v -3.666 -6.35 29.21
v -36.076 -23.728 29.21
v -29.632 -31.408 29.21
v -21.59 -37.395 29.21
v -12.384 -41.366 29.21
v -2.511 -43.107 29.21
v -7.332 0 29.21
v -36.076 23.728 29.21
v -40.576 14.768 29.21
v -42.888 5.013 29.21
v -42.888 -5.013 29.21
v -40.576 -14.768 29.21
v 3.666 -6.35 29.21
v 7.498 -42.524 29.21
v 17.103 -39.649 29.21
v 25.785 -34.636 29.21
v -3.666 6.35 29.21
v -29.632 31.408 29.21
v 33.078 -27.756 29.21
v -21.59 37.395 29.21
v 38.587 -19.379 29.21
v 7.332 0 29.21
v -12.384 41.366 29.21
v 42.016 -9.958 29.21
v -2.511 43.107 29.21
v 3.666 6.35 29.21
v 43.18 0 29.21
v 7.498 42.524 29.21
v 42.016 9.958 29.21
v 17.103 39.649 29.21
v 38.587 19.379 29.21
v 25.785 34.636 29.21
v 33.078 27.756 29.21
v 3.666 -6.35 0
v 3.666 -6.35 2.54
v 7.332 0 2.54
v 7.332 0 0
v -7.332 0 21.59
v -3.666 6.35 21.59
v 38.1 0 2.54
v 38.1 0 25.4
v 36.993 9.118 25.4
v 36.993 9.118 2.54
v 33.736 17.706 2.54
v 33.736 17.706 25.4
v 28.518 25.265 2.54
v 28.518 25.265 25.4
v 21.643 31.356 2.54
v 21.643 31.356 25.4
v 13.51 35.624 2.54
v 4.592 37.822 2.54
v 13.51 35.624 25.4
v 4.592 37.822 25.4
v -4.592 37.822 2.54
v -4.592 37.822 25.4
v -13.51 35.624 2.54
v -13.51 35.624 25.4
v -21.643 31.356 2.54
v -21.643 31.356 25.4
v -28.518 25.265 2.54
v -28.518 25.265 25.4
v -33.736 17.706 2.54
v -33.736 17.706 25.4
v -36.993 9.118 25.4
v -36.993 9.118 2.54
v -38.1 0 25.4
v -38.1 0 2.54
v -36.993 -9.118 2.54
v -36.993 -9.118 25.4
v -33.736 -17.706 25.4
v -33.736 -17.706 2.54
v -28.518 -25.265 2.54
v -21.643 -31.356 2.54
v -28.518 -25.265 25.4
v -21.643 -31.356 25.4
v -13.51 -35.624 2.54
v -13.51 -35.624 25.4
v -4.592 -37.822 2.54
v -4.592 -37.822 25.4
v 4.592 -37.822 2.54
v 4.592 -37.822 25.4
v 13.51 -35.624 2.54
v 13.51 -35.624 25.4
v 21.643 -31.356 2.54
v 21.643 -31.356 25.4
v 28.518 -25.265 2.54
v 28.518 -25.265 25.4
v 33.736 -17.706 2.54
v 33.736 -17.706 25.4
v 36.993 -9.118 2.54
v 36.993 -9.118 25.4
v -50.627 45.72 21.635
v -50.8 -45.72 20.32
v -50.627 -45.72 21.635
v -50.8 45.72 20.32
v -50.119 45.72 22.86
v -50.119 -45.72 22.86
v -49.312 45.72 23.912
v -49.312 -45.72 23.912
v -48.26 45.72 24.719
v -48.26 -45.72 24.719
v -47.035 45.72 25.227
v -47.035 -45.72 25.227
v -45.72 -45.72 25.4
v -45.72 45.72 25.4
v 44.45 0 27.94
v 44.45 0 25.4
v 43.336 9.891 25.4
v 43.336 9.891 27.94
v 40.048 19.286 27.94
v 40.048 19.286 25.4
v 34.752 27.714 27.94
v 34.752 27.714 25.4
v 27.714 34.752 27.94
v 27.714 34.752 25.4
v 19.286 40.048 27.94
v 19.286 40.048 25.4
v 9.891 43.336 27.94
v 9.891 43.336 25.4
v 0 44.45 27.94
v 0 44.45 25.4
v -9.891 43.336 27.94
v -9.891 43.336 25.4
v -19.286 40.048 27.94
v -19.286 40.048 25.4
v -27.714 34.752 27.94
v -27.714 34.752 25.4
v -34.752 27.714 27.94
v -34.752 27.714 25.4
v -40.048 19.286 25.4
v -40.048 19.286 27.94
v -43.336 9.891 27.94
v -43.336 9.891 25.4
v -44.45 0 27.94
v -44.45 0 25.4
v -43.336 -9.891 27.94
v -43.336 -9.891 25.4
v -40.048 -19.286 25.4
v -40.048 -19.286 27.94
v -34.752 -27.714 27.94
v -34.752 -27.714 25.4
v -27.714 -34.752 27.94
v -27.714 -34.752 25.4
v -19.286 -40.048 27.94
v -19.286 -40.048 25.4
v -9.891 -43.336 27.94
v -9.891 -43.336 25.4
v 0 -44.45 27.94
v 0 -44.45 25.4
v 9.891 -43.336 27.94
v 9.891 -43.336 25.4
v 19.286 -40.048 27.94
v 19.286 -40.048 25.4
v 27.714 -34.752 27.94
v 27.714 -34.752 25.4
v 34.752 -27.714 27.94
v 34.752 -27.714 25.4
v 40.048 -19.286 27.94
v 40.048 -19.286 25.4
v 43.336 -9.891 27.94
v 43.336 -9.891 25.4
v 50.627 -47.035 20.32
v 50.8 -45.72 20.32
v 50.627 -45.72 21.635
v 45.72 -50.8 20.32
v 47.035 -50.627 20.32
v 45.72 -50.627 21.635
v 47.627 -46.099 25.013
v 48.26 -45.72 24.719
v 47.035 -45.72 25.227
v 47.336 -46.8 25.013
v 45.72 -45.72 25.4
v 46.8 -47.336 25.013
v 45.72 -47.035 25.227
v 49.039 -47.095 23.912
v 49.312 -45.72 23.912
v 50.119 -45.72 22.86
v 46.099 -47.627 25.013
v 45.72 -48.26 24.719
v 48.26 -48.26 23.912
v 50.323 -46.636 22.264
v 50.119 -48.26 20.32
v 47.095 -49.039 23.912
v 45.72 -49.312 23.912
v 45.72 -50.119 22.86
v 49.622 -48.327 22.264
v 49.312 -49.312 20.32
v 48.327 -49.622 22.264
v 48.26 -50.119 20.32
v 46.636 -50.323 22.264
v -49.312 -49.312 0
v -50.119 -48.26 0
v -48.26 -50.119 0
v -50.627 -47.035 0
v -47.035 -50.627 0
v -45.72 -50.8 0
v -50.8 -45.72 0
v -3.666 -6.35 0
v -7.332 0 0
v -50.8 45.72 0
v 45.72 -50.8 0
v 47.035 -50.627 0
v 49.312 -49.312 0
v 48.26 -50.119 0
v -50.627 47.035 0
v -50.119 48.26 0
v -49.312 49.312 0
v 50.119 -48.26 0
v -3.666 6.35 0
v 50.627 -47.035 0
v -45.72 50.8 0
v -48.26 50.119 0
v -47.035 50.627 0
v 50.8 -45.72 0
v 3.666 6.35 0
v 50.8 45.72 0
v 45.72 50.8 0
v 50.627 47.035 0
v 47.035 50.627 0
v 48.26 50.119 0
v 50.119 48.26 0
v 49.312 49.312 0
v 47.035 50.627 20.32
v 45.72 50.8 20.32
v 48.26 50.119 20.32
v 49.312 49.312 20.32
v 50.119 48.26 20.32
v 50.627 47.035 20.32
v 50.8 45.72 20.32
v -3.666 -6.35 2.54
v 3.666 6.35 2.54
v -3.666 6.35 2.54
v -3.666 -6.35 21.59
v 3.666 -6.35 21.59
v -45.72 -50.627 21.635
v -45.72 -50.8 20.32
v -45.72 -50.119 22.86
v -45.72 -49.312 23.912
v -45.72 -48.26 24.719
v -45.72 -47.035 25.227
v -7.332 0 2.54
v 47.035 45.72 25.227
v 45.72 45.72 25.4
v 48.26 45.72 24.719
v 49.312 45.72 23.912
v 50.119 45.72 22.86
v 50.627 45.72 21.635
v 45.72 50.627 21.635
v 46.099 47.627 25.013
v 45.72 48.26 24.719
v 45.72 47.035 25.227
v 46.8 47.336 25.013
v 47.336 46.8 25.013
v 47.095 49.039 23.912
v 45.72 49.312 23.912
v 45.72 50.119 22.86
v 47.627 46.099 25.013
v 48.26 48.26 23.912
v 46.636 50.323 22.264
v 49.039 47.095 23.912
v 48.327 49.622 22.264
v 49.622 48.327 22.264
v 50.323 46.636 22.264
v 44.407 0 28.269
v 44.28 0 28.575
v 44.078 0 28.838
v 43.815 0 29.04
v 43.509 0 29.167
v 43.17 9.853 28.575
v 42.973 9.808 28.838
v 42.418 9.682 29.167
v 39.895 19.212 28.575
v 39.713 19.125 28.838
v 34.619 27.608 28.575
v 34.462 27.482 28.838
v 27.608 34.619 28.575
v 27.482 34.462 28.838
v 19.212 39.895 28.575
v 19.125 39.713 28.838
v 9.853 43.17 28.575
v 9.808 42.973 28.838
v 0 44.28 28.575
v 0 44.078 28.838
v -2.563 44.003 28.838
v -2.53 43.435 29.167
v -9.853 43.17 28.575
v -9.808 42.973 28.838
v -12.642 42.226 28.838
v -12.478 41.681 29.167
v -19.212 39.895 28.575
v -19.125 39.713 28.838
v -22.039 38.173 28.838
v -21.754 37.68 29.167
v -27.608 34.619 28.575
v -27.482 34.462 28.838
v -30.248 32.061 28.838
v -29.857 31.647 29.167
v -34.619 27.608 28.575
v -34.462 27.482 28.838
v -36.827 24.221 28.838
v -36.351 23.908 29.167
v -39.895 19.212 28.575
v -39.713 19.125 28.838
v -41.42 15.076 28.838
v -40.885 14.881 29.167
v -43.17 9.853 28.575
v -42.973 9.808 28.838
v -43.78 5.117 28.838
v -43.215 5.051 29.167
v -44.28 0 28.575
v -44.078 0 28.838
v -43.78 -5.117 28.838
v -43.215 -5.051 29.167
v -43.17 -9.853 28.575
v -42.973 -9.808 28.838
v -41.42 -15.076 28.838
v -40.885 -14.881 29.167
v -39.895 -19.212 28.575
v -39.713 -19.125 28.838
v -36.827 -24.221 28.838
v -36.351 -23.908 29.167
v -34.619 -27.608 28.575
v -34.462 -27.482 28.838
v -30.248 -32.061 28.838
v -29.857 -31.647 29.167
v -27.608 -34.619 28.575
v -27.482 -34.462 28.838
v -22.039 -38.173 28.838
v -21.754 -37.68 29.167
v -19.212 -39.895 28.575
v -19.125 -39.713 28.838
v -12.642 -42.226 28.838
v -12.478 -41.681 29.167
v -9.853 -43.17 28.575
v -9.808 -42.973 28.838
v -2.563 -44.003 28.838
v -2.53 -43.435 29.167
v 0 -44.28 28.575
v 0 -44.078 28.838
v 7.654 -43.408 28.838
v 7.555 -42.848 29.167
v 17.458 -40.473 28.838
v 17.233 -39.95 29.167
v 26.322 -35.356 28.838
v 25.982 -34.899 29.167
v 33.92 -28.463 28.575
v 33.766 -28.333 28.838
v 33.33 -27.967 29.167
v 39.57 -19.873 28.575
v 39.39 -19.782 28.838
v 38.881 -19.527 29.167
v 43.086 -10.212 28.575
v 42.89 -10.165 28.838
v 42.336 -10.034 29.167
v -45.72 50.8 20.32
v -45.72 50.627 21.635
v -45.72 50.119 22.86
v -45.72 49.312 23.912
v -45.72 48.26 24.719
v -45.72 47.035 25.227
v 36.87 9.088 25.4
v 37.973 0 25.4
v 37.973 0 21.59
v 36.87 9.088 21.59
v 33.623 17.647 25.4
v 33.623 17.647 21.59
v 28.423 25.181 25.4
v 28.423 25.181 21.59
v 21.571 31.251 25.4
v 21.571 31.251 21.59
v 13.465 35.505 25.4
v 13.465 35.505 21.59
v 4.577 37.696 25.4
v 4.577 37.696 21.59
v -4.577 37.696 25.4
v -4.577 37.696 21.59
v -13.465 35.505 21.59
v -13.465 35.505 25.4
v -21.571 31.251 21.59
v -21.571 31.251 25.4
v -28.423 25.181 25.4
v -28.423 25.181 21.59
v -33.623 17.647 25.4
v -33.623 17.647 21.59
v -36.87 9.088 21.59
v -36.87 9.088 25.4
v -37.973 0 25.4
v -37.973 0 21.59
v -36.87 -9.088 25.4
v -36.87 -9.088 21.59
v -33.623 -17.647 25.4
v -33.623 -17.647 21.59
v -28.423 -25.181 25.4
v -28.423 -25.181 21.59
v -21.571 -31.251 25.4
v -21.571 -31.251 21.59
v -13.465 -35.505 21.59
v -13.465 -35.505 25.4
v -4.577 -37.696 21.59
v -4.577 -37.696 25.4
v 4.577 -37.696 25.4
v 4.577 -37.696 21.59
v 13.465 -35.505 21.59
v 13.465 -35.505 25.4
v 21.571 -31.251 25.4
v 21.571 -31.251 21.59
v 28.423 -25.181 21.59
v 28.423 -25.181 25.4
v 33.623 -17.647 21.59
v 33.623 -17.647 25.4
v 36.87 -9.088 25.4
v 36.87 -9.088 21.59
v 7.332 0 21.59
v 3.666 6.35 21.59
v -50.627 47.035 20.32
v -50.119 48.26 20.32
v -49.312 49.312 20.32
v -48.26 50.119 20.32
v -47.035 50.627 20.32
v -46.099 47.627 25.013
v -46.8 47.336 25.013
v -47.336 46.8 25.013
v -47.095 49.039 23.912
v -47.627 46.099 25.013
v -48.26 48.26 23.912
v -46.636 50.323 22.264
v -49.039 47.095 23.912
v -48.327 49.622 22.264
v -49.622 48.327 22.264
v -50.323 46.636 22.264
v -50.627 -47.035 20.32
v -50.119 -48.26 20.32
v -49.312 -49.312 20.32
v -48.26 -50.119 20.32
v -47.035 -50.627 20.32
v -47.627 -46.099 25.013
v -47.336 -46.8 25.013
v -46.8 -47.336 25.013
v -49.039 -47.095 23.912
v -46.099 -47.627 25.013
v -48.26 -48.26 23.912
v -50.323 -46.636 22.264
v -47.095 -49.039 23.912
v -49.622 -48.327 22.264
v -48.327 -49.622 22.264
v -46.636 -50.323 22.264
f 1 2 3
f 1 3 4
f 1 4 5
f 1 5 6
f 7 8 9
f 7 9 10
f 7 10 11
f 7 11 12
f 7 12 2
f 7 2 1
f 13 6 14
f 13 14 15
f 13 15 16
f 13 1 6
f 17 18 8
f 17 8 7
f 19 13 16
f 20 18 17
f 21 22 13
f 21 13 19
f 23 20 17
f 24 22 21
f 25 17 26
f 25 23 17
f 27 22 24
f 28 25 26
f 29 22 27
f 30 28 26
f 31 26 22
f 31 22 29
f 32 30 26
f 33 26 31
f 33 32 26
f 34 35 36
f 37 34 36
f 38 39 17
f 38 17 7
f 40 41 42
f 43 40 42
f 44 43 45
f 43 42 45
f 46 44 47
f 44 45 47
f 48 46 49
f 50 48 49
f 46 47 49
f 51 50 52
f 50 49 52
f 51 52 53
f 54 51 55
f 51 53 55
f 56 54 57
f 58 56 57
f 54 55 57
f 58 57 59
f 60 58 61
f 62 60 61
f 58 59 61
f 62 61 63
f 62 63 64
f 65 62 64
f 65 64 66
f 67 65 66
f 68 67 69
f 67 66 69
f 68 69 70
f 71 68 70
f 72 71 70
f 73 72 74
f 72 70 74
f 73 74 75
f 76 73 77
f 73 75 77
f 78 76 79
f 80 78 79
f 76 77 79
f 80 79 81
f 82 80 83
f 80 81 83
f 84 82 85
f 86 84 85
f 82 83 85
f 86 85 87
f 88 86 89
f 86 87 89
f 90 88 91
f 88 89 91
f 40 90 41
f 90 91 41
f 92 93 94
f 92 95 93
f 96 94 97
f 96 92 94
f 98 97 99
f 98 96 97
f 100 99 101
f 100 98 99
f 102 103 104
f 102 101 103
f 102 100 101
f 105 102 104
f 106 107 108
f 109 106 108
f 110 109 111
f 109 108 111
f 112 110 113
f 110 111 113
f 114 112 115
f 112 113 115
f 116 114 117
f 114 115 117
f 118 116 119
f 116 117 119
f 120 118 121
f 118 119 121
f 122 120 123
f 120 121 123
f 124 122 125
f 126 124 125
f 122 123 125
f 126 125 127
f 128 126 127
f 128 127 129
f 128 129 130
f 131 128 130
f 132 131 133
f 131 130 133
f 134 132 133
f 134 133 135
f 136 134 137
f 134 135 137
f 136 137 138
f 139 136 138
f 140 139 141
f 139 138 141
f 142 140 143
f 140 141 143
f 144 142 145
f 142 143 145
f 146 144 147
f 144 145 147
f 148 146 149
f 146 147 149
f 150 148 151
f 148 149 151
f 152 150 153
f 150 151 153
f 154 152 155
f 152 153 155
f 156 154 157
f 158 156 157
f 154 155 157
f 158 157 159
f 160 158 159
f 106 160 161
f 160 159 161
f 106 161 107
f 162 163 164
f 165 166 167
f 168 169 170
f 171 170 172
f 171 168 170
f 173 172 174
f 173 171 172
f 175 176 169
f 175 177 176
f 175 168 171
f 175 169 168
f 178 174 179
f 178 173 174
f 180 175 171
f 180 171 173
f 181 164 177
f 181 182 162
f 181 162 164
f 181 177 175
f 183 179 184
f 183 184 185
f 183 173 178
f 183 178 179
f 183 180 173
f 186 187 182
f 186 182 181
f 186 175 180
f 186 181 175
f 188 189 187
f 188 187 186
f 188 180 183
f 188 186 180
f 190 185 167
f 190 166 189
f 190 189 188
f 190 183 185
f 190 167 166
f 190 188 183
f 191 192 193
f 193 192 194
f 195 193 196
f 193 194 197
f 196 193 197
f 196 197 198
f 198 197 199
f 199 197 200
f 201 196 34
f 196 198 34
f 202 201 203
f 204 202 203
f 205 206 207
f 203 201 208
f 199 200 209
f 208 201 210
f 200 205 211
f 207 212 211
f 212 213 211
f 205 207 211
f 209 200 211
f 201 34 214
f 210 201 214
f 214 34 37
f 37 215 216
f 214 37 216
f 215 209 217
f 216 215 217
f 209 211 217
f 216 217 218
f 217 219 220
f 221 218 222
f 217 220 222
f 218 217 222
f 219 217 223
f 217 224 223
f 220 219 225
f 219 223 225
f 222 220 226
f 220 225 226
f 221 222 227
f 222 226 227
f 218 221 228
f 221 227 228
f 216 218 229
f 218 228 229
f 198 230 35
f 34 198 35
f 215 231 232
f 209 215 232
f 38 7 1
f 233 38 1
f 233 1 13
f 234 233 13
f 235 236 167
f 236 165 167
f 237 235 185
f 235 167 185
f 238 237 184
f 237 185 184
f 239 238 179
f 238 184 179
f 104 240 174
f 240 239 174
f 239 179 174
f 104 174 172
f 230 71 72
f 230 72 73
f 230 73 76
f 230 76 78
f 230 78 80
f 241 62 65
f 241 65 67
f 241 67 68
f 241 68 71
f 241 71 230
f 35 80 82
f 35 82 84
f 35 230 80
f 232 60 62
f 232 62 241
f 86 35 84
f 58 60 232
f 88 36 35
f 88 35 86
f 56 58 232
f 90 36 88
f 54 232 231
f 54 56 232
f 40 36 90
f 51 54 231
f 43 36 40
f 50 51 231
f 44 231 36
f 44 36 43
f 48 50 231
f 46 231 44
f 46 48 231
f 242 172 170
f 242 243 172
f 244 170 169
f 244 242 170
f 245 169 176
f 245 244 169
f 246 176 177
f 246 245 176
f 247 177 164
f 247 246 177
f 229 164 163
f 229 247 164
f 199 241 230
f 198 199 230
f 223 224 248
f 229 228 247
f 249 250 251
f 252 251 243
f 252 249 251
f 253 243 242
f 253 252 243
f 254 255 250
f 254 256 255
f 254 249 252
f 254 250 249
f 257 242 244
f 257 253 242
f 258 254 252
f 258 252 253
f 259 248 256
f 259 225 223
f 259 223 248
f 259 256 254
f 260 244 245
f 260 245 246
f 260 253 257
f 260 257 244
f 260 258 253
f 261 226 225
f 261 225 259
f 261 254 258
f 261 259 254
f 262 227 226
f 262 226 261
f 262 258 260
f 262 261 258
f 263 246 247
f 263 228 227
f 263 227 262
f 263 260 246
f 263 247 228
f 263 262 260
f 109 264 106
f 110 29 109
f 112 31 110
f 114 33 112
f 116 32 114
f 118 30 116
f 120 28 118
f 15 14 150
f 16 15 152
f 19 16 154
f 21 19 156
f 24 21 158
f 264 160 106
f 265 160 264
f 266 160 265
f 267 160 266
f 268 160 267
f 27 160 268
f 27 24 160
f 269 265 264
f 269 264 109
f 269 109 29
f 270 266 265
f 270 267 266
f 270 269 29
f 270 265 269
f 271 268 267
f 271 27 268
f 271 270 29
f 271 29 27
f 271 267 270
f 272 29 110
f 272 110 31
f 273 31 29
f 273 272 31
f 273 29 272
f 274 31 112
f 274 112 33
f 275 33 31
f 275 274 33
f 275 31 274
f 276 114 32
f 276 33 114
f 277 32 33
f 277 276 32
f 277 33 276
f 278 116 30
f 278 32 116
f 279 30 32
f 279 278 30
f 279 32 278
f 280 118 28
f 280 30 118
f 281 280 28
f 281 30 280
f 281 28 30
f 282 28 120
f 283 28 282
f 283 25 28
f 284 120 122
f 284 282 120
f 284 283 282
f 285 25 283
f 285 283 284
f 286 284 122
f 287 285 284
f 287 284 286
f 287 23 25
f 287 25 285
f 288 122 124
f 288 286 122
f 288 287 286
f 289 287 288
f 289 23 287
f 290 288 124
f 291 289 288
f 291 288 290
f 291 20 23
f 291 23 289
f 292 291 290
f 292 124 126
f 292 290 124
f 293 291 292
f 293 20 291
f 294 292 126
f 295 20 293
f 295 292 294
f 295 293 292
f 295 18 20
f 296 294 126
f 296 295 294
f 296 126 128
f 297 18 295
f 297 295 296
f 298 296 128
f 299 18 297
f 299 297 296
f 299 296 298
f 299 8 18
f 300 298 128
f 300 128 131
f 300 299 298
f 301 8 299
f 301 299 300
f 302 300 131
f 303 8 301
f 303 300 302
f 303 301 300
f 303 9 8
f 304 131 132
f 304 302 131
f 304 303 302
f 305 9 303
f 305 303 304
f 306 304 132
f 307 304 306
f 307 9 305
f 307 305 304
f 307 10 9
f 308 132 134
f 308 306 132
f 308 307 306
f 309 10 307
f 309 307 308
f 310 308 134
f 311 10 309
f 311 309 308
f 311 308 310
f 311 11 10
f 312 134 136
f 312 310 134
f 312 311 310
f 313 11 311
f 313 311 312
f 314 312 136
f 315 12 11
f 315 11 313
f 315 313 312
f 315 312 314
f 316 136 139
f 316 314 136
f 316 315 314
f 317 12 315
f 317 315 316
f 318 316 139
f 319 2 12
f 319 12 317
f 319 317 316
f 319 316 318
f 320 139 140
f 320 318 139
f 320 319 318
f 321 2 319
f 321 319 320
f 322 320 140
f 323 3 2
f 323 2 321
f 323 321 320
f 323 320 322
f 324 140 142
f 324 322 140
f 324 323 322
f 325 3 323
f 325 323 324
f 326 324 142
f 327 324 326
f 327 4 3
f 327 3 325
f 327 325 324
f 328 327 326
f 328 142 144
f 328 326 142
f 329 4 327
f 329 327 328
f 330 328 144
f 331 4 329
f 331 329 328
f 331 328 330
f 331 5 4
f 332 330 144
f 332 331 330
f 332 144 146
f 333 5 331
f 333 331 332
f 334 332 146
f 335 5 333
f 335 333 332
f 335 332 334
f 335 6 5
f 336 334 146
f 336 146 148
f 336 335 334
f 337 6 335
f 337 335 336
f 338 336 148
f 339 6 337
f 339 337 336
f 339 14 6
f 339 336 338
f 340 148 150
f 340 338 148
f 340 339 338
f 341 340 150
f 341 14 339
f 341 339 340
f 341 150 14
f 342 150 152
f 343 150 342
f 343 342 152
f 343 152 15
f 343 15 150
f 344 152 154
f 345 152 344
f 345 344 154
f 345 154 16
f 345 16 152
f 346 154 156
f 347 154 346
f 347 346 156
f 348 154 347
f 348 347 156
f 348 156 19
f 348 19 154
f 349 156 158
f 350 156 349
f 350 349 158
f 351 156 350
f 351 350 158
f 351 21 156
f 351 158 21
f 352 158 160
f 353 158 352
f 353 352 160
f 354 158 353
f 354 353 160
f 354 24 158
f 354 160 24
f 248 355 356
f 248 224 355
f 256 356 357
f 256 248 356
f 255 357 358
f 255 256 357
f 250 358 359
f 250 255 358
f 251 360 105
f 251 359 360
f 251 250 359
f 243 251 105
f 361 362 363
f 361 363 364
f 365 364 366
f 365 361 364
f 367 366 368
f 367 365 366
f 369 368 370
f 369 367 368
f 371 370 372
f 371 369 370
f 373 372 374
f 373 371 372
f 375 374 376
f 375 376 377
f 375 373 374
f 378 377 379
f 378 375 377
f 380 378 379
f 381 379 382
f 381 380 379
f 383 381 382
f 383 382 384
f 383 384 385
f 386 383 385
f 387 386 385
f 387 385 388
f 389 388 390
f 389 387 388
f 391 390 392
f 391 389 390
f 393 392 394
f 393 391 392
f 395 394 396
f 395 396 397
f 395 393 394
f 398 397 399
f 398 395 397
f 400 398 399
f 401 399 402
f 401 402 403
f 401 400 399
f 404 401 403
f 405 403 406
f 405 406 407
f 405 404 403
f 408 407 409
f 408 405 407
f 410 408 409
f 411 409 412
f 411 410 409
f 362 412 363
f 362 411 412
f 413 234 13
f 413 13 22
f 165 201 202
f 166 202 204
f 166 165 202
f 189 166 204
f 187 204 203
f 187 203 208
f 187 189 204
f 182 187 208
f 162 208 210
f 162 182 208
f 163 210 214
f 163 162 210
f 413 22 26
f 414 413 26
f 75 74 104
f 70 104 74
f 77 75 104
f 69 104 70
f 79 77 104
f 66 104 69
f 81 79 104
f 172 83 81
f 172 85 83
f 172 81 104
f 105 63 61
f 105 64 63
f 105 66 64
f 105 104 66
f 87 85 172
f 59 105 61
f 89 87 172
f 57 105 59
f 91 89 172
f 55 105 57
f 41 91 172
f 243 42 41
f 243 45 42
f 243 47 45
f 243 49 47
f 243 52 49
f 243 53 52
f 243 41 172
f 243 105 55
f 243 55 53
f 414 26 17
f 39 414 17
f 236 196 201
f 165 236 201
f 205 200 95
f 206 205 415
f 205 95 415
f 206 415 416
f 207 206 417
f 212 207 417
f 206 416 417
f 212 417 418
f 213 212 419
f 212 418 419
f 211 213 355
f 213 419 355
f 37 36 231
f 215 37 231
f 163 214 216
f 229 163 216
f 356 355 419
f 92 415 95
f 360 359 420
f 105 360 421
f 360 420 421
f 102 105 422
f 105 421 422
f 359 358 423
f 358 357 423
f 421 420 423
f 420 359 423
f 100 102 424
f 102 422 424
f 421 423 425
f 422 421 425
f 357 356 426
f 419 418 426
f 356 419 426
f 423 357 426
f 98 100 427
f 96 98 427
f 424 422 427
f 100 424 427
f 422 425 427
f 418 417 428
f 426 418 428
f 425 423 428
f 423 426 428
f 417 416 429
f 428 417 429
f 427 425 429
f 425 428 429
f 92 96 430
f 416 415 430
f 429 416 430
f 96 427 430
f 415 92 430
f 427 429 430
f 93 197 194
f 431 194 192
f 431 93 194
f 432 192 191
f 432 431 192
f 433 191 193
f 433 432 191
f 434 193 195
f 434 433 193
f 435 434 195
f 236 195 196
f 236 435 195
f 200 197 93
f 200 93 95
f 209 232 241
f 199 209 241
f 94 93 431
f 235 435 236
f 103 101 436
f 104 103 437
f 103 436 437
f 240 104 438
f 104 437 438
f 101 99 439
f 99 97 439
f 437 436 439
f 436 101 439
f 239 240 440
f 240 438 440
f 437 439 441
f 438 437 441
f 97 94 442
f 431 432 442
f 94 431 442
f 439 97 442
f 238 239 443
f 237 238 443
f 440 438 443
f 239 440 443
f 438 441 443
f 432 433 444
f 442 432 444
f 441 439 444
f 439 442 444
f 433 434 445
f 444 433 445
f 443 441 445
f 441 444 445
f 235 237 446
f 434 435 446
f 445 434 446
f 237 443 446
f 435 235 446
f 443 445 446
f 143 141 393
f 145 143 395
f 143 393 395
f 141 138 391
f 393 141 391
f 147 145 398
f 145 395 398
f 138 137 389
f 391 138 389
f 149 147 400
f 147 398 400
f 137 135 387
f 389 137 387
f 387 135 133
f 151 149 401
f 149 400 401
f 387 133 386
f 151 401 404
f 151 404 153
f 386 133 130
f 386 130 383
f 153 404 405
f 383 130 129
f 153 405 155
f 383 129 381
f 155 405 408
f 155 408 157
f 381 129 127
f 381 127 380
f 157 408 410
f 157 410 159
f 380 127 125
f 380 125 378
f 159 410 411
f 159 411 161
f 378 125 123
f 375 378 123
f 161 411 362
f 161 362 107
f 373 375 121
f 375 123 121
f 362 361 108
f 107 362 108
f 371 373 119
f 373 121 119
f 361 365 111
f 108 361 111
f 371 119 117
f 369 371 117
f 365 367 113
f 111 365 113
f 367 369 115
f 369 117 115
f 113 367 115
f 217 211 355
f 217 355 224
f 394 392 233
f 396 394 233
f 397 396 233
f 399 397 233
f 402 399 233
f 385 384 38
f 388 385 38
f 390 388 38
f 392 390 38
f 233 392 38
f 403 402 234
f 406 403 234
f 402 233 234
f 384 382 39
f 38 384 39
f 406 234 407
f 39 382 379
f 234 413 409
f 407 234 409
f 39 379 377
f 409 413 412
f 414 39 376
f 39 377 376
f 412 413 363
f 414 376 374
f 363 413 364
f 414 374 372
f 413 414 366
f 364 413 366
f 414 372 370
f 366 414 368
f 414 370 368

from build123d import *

# Parameters (mm, degrees)
F0_W      = 101.6
F0_H      = 101.6
F1_DEPTH  = 25.4
F2_R      = 38.1
F3_DEPTH  = 22.86
F4_R      = 37.973
F5_DEPTH  = 3.81
F6_R      = 44.45
F6_R_2    = 37.973
F7_DEPTH  = 3.81
F8_R      = 5.08
F9_R      = 1.27
F12_DEPTH = 248.92


with BuildPart() as f1:
    # F0 (on Top) → F1 (new body)
    with BuildSketch(Plane.XY):
        Rectangle(F0_W, F0_H)
    extrude(amount=F1_DEPTH)

    # F2 (on face) → F3 (cut)
    with BuildSketch(Plane.XY.offset(25.4)):
        Circle(F2_R)
    extrude(amount=-F3_DEPTH, mode=Mode.SUBTRACT)

    # F8
    f8_edges = [f1.edges().sort_by_distance(p)[0] for p in [
        (-50.8, -50.8, 12.7),
        (50.8, -50.8, 12.7),
        (50.8, 50.8, 12.7),
        (-50.8, 50.8, 12.7),
        (0, 50.8, 25.4),
        (-50.8, 0, 25.4),
        (50.8, 0, 25.4),
        (0, -50.8, 25.4),
    ]]
    fillet(f8_edges, radius=F8_R)


with BuildPart() as f5:
    # F4 (on face) → F5 (new body)
    with BuildSketch(Plane.XY.offset(25.4)):
        Circle(F4_R)
    extrude(amount=-F5_DEPTH)

    # F6 (on face) → F7 (join)
    with BuildSketch(Plane.XY.offset(25.4)):
        Circle(F6_R)
        Circle(F6_R_2, mode=Mode.SUBTRACT)
        Circle(F6_R_2)
    extrude(amount=F7_DEPTH)

    # F9
    f9_edges = [f5.edges().sort_by_distance(p)[0] for p in [
        (-44.45, 0, 29.21),
    ]]
    fillet(f9_edges, radius=F9_R)


with BuildPart() as f12:
    # F11 (on offset) → F12 (new body)
    with BuildSketch(Plane.XY.offset(127)):
        Polygon((3.6661742094, 6.35), (-3.6661742094, 6.35), (-7.3323484187, 0), (-3.6661742094, -6.35), (3.6661742094, -6.35), (7.3323484187, 0), align=None)
    extrude(amount=-F12_DEPTH)


with BuildPart() as f1_1:
    add(f1.part)

    # F13: cut F12
    add(f12.part, mode=Mode.SUBTRACT)


with BuildPart() as f5_1:
    add(f5.part)

    # F13: cut F12
    add(f12.part, mode=Mode.SUBTRACT)


solid = Compound([f1_1.part, f5_1.part])
